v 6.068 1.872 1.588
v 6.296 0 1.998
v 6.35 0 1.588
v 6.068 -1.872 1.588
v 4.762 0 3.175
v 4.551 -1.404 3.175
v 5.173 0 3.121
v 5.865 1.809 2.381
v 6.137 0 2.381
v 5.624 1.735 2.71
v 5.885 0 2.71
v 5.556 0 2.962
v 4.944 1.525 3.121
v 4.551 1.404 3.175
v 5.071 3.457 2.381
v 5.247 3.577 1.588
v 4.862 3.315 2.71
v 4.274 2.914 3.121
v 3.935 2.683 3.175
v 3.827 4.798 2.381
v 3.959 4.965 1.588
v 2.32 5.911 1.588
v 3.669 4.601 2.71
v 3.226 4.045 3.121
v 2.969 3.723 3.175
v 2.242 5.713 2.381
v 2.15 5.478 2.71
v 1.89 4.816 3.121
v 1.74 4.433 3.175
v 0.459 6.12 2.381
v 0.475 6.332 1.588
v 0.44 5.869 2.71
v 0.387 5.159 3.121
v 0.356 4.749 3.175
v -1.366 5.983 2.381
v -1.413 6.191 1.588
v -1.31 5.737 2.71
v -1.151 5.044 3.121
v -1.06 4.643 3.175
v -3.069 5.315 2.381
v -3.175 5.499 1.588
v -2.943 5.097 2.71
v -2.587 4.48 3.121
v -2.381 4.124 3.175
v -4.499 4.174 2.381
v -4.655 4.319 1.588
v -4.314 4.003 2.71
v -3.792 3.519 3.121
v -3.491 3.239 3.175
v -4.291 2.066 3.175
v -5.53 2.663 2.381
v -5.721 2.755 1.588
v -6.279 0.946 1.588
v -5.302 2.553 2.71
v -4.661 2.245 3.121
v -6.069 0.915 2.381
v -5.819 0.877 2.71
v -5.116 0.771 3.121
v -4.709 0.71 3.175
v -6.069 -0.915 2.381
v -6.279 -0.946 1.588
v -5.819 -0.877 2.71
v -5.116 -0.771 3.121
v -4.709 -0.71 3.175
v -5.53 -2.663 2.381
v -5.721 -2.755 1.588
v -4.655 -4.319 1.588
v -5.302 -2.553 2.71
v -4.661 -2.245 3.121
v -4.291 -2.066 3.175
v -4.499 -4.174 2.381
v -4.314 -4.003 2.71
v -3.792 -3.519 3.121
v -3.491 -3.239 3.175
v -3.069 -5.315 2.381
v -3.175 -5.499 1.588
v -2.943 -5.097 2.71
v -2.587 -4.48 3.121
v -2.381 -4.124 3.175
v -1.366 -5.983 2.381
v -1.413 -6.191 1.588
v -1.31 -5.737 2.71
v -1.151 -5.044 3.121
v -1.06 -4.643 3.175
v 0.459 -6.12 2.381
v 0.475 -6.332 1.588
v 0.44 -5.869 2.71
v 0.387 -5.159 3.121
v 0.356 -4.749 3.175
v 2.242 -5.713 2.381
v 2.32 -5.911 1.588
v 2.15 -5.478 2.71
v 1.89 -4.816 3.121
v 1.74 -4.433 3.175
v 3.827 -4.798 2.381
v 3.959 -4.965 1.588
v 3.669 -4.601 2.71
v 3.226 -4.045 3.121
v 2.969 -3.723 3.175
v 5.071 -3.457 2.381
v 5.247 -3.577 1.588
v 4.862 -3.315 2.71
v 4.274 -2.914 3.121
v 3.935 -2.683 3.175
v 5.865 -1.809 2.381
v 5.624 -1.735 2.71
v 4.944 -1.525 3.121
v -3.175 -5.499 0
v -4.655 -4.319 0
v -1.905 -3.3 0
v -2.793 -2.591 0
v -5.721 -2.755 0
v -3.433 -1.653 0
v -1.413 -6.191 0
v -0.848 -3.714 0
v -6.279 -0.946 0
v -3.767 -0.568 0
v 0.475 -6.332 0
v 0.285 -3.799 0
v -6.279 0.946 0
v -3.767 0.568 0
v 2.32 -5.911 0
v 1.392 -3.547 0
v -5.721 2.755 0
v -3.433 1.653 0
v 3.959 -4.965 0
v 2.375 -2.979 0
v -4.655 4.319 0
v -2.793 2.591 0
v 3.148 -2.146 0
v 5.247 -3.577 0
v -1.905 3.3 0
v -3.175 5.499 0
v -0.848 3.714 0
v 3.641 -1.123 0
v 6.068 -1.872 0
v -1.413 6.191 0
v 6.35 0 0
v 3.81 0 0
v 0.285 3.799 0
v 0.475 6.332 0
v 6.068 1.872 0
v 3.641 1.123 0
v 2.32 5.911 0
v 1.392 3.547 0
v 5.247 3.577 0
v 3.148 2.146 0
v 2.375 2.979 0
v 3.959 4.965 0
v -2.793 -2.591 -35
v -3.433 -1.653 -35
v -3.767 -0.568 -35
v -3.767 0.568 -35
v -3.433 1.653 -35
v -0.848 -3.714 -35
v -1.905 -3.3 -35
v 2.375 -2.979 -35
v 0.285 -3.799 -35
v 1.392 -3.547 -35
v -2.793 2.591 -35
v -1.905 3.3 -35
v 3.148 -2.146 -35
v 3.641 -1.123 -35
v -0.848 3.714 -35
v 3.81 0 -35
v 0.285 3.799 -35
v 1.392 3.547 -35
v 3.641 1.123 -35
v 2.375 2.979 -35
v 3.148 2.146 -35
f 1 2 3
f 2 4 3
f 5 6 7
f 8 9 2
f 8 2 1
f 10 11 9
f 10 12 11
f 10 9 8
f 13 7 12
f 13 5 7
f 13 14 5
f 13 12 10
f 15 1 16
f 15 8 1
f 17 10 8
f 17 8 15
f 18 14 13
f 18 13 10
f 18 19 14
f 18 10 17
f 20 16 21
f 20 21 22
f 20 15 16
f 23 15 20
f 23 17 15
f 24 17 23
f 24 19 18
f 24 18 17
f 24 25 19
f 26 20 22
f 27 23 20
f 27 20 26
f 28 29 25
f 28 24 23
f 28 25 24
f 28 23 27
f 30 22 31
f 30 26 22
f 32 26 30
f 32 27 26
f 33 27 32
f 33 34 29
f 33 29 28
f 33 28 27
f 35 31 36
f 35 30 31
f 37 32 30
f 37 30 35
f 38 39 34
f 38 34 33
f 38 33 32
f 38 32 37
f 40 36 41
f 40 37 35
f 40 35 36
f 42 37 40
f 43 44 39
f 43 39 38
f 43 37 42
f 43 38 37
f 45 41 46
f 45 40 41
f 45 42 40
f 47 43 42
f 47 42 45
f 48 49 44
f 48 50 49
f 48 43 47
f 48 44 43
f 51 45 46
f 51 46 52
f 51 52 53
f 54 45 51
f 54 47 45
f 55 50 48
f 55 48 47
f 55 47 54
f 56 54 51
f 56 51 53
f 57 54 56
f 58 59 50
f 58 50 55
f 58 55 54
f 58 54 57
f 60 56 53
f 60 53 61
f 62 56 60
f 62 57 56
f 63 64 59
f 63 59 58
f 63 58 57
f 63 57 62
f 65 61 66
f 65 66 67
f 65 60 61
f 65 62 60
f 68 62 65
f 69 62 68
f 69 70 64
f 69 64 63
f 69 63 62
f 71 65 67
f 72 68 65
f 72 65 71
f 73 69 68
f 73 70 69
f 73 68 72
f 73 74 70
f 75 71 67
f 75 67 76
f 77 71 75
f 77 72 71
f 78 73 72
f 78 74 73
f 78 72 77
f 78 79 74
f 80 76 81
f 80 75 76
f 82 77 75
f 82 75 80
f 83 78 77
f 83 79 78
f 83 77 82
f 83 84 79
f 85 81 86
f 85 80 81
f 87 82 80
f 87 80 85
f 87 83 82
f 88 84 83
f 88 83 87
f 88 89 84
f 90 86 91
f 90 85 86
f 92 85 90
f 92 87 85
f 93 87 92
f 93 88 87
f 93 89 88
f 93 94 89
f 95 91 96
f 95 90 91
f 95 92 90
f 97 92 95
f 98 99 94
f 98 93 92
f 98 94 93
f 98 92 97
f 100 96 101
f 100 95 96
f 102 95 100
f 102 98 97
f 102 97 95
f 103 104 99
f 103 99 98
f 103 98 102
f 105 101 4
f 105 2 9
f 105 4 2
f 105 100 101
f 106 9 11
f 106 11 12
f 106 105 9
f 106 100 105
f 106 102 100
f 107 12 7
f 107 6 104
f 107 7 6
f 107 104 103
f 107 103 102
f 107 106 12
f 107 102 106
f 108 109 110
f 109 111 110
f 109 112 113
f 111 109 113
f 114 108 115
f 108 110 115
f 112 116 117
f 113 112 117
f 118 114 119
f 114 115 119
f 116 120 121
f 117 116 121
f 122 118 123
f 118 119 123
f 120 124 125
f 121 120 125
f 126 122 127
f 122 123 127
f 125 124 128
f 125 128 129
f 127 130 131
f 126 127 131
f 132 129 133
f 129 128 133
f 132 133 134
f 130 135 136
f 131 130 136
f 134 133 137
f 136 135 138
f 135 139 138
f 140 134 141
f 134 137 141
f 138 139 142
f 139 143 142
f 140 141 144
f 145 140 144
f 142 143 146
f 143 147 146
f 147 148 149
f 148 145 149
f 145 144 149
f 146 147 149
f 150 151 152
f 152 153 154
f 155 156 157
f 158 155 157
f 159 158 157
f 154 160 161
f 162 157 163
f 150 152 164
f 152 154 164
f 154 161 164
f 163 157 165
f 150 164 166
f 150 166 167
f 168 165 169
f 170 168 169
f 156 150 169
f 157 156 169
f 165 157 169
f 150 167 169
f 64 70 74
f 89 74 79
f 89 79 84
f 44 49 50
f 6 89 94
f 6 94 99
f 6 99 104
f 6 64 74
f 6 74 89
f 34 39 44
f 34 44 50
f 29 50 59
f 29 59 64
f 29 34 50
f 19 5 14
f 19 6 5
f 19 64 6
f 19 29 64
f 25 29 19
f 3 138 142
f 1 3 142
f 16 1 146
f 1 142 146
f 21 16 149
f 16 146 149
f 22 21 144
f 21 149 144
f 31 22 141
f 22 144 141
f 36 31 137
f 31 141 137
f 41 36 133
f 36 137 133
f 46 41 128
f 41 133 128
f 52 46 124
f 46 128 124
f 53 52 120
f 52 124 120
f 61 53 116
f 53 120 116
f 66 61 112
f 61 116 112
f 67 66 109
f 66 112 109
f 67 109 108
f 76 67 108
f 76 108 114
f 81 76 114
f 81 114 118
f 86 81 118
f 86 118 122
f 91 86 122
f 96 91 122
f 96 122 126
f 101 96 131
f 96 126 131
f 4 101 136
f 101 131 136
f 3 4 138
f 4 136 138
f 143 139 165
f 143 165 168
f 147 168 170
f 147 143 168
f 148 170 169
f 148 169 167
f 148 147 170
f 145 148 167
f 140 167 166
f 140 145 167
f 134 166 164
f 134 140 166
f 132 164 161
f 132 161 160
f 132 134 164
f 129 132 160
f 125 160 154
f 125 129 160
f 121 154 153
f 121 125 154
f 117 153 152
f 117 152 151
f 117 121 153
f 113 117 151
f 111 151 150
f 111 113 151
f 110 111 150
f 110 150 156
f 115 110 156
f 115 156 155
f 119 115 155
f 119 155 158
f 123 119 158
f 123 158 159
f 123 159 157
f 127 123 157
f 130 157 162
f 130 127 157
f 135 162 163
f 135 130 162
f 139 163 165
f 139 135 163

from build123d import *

# Parameters (mm, degrees)
SKETCH1_R           = 3.81
BASE_EXTRUDE_DEPTH  = 35
SKETCH2_R           = 6.35
BOSS_EXTRUDE1_DEPTH = 3.175
FILLET1_R           = 1.5875


with BuildPart() as part:
    # Sketch1 → Base-Extrude (new body)
    with BuildSketch(Plane.XY):
        Circle(SKETCH1_R)
    extrude(amount=-BASE_EXTRUDE_DEPTH)

    # Sketch2 → Boss-Extrude1 (add)
    with BuildSketch(Plane.XY):
        Circle(SKETCH2_R)
    extrude(amount=BOSS_EXTRUDE1_DEPTH)

    # Fillet1
    fillet1_edges = [part.edges().sort_by_distance(p)[0] for p in [
        (-6.35, 0, 3.175),
    ]]
    fillet(fillet1_edges, radius=FILLET1_R)


solid = part.part
